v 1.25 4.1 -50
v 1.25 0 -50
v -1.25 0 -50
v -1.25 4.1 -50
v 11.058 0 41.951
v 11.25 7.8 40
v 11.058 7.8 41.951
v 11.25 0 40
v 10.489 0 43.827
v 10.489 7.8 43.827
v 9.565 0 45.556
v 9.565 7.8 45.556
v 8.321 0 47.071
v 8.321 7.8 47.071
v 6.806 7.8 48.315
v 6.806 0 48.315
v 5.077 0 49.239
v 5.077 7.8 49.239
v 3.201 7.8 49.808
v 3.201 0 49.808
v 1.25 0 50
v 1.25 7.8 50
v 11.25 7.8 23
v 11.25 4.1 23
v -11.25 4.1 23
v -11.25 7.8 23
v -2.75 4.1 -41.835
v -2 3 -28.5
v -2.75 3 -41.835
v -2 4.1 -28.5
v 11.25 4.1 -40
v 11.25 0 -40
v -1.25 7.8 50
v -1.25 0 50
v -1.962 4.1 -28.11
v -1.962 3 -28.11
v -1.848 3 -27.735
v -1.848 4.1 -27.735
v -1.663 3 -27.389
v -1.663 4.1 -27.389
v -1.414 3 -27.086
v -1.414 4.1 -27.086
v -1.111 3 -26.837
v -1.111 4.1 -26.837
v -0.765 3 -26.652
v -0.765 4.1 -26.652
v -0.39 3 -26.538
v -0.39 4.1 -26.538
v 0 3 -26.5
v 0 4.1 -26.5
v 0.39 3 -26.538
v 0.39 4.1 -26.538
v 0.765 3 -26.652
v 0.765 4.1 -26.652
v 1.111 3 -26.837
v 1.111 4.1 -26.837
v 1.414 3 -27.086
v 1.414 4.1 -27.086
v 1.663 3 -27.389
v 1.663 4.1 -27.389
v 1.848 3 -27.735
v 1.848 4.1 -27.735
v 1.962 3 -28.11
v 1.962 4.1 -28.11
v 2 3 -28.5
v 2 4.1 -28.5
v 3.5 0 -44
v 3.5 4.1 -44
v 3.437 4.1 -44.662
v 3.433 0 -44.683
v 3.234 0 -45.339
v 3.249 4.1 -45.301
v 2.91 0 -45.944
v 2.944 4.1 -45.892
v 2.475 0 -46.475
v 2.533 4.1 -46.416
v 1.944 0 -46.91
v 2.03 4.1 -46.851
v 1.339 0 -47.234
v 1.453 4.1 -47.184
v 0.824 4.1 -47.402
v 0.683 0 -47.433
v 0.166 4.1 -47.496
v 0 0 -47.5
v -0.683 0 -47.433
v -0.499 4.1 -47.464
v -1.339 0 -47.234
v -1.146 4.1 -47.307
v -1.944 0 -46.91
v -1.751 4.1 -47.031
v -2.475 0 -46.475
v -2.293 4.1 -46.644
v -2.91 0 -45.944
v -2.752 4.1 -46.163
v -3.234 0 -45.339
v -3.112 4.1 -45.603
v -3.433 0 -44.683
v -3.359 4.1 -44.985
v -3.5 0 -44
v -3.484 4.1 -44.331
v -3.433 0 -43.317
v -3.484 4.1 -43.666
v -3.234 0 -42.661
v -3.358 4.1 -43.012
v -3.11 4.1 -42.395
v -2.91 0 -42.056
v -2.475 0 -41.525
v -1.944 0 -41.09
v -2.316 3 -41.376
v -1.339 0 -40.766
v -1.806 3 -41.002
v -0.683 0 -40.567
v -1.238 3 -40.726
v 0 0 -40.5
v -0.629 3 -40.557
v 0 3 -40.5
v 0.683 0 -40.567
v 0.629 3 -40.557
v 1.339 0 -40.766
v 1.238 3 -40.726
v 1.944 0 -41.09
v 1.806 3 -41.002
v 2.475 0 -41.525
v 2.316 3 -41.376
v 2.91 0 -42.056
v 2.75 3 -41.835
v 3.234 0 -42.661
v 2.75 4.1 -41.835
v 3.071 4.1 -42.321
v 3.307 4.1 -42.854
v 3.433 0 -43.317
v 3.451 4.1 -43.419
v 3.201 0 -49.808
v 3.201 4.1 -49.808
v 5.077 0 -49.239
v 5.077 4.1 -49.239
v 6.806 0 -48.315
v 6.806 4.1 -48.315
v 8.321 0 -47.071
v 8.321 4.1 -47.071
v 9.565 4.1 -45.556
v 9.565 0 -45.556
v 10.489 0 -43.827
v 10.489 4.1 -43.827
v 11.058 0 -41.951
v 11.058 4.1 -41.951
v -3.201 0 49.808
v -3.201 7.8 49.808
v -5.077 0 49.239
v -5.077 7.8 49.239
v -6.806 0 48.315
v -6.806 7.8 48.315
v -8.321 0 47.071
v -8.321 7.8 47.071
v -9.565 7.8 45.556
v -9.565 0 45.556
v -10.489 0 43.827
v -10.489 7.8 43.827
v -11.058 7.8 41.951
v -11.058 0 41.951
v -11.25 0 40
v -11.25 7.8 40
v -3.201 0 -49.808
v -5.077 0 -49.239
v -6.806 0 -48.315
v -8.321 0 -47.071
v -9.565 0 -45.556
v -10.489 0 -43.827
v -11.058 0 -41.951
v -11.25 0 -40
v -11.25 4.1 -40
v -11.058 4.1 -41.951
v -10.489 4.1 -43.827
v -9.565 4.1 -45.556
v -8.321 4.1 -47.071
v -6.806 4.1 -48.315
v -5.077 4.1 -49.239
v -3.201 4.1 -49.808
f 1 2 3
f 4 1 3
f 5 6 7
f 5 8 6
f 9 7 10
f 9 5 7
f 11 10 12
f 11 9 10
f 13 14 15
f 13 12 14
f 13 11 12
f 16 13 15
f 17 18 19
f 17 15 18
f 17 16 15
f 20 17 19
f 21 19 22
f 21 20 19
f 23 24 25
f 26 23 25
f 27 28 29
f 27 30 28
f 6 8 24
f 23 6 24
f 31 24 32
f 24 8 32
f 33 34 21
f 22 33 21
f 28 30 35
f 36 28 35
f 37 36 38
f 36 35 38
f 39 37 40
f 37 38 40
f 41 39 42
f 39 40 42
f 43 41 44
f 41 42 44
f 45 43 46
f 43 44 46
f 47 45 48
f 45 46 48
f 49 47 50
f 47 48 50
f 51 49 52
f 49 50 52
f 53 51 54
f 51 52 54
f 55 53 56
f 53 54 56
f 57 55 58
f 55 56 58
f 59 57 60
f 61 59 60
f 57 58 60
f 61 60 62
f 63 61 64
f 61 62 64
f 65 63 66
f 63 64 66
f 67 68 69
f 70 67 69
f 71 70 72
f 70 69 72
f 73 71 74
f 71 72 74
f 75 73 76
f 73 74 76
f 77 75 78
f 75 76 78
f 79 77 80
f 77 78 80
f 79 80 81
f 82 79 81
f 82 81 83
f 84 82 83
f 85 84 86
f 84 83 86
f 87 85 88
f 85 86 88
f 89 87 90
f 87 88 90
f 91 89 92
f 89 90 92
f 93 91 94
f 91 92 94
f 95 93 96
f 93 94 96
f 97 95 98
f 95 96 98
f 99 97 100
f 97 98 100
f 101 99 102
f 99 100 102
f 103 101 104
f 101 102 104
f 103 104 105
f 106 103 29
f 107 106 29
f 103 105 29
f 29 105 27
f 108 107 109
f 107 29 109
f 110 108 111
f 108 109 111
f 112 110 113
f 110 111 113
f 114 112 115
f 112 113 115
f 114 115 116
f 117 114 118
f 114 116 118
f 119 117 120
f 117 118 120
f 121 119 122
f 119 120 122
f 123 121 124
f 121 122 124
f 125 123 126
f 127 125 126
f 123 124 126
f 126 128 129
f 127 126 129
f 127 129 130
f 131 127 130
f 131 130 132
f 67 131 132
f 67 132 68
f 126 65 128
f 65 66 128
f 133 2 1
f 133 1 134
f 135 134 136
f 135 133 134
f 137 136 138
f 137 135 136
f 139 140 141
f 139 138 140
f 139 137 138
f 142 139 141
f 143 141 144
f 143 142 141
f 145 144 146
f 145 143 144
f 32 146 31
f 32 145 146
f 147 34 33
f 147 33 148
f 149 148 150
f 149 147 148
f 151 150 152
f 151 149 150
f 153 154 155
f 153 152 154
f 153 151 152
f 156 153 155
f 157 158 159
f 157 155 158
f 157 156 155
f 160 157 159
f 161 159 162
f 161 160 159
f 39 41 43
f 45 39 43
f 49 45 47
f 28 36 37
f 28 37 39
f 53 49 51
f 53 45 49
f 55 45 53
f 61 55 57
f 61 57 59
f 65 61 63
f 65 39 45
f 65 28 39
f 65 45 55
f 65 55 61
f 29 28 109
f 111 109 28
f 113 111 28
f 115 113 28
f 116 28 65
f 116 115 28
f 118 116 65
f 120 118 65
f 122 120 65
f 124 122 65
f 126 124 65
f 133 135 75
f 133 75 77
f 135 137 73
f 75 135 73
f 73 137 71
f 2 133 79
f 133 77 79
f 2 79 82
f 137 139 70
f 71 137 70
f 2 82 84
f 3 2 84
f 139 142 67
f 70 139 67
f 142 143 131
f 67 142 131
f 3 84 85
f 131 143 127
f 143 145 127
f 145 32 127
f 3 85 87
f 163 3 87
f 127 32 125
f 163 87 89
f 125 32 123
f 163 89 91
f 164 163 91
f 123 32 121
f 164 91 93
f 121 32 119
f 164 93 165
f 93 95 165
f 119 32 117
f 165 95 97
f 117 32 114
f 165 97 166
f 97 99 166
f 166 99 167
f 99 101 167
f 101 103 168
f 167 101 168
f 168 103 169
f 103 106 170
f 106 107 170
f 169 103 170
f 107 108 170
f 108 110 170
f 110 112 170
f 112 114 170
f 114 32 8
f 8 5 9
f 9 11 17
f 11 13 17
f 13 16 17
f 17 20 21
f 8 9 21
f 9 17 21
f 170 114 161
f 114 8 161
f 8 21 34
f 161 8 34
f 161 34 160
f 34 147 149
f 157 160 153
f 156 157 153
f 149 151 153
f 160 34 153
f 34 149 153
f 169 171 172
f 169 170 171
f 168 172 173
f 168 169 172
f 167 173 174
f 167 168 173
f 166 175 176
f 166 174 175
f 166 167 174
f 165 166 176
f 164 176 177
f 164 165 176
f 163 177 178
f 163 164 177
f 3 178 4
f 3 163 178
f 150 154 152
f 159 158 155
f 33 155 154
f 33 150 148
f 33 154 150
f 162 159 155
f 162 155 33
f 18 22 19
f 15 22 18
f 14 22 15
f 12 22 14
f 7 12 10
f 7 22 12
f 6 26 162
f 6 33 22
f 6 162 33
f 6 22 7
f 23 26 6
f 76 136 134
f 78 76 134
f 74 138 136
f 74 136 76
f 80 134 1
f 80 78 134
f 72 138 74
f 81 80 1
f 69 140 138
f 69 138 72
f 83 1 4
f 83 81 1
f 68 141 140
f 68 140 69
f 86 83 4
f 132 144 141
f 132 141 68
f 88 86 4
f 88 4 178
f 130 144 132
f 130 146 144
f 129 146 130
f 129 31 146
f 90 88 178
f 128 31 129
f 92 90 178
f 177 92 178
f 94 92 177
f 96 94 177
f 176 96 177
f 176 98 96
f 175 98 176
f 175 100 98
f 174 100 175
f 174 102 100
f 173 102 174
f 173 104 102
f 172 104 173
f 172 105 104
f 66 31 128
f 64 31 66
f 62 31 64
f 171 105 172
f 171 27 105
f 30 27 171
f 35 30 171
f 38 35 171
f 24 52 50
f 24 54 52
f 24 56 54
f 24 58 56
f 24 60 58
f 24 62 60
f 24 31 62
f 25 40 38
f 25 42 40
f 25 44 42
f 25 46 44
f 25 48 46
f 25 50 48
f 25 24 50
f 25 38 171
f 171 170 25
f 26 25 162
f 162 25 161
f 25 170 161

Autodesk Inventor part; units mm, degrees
ref_plane "YZ Plane" through (0, 0, 0) normal (1, 0, 0) x (0, 1, 0)
ref_plane "XZ Plane" through (0, 0, 0) normal (0, 1, 0) x (-1, 0, 0)
ref_plane "XY Plane" through (0, 0, 0) normal (0, 0, 1) x (1, 0, 0)
sketch "Szkic1" plane through (0, 0, 0) normal (0, 1, 0) x (-1, 0, 0)
  line L0 (1.25, 50) -> (-1.25, 50)
  line L1 (-11.25, 40) -> (-11.25, -40)
  line L2 (-1.25, -50) -> (1.25, -50)
  line L3 (11.25, -40) -> (11.25, 40)
  line L4 (11.25, 50) -> (-11.25, -50)
  line L5 (11.25, -50) -> (-11.25, 50)
  arc A0 (11.25, 40) -> (1.25, 50) centre (1.25, 40) ccw
  arc A1 (-1.25, 50) -> (-11.25, 40) centre (-1.25, 40) ccw
  arc A2 (1.25, -50) -> (11.25, -40) centre (1.25, -40) ccw
  arc A3 (-11.25, -40) -> (-1.25, -50) centre (-1.25, -40) ccw
  point P0 (0, 0)
  point P1 (0, 0)
  dimension "d0" = 22.5
  dimension "d1" = 100
  dimension "d2" = 10
extrude "Wyciągnięcie proste1" add sketch "Szkic1" along normal blind 4.1
sketch "Szkic2" plane through (0, 4.1, 0) normal (0, 1, 0) x (1, 0, 0)
  circle A0 centre (0, 44) radius 3.5
  line L0 (1.25, 50) -> (-1.25, 50) projected
  point P0 (0, 0)
  point P1 (0, 50)
  dimension "d5" = 7
  dimension "d14" = 6
extrude "Wyciągnięcie proste2" cut sketch "Szkic2" against normal blind 8
sketch "Szkic3" plane through (0, 4.1, 0) normal (0, 1, 0) x (1, 0, 0)
  line L0 (0, 47.5) -> (0, 28.5)
  arc A0 (-2, 28.5) -> (2, 28.5) centre (0, 28.5) ccw
  line L1 (-2.75, 41.8349) -> (0, 41.8349)
  line L2 (1.25, 50) -> (-1.25, 50) projected
  line L3 (-2, 28.5) -> (-2.75, 41.8349)
  line L4 (2, 28.5) -> (2.75, 41.8349)
  line L5 (0, 41.8349) -> (2.75, 41.8349)
  circle A1 centre (0, 44) radius 3.5 projected
  point P0 (0, 0)
  point P1 (0, 50)
  dimension "d8" = 19
  dimension "d10" = 5.5
  dimension "d22" = 13.3349
extrude "Wyciągnięcie proste3" cut sketch "Szkic3" against normal blind 1.1 contours L5 A1 L0 | L0 A1 L1 | A1 L4 A0 L3 picked at (1.6483, 41.6479) picked at (-1.6483, 41.6479)
sketch "Szkic9" plane through (0, 4.1, 0) normal (0, 1, 0) x (1, 0, 0)
  line L0 (-1.25, -50) -> (1.25, -50)
  line L1 (11.25, -40) -> (11.25, -23)
  line L2 (11.25, -23) -> (-11.25, -23)
  line L3 (-11.25, -23) -> (-11.25, -40)
  line L4 (-1.25, -50) -> (1.25, -50) projected
  arc A0 (-11.25, -40) -> (-1.25, -50) centre (-1.25, -40) ccw
  arc A1 (1.25, -50) -> (11.25, -40) centre (1.25, -40) ccw
  point P0 (0, 0)
  point P1 (0, -50)
  dimension "d36" = 27
  dimension "d37" = 22.5
  dimension "d38" = 10
extrude "Wyciągnięcie proste7" add sketch "Szkic9" along normal blind 3.7
properties part number "arm_big_part_v2"
